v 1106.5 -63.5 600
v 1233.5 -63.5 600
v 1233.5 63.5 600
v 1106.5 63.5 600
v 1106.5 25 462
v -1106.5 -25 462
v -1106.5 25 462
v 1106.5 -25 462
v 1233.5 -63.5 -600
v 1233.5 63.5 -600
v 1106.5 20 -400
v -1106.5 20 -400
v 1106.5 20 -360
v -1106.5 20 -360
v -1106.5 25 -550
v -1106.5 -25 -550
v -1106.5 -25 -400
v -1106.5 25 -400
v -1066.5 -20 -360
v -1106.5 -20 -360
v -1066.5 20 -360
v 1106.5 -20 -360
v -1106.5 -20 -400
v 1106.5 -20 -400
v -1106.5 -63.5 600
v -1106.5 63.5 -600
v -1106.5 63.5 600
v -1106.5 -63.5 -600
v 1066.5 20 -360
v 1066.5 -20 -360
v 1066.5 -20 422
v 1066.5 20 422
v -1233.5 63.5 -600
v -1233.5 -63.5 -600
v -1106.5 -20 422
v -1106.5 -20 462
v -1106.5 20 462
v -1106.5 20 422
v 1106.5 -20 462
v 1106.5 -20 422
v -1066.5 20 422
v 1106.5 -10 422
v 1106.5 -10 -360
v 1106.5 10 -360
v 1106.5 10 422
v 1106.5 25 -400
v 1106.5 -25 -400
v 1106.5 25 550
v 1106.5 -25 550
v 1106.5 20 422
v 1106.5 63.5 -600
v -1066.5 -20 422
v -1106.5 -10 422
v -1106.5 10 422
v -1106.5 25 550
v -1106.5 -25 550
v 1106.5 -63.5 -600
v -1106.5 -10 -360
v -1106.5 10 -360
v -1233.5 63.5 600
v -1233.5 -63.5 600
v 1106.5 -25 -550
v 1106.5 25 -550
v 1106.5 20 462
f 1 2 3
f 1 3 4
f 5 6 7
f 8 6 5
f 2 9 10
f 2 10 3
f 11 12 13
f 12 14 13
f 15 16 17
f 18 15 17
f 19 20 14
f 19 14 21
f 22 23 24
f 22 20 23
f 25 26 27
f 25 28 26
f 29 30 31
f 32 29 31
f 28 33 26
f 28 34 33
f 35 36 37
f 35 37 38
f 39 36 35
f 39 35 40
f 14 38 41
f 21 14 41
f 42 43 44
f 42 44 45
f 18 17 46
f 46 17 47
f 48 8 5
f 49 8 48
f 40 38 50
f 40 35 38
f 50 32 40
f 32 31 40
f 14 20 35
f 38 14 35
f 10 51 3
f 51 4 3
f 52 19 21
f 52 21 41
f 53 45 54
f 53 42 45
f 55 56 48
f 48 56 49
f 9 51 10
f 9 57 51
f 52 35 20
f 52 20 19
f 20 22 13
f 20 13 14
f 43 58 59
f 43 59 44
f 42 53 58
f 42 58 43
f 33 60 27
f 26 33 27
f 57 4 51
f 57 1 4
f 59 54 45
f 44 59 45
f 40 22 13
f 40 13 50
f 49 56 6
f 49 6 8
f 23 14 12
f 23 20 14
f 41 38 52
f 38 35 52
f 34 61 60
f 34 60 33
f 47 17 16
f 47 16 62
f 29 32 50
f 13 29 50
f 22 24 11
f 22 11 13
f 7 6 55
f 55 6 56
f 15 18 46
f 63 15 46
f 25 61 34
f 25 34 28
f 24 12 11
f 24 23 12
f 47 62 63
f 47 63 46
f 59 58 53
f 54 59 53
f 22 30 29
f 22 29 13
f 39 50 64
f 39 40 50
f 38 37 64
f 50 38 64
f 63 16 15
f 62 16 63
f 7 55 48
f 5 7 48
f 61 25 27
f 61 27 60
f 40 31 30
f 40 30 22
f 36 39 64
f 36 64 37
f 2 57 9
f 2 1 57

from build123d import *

# Parameters (mm, degrees)
F1_DEPTH      = 63.5
F1_DEPTH_BACK = 63.5
F0_W          = 2213
F0_H          = 150
F2_DEPTH      = 25
F2_DEPTH_BACK = 25
F0_H_2        = 88
F3_DEPTH      = 20
F3_DEPTH_BACK = 20
F0_W_2        = 40
F0_H_3        = 782
F0_W_3        = 2133
F4_DEPTH      = 10
F4_DEPTH_BACK = 10
F5_DEPTH      = 20
F5_DEPTH_BACK = 20


# Not quite as in the source:
# - a feature names something its author has since deleted; it is built from what else it names


with BuildPart() as f1:
    # F0 (on Front) → F1 (new body, two sides)
    with BuildSketch(Plane.XZ) as f1_sk:
        Polygon((-1106.5, -600), (-1106.5, -550), (-1106.5, -400), (-1106.5, -360), (-1106.5, 422), (-1106.5, 462), (-1106.5, 550), (-1106.5, 600), (-1233.5, 600), (-1233.5, -600), align=None)
    extrude(amount=F1_DEPTH)
    extrude(f1_sk.sketch, amount=-F1_DEPTH_BACK)


with BuildPart() as f1b:
    # F0 (on Front) → F1, piece 2 (new body, two sides)
    with BuildSketch(Plane.XZ) as f1_2_sk:
        Polygon((1106.5, -600), (1233.5, -600), (1233.5, 600), (1106.5, 600), (1106.5, 550), (1106.5, 462), (1106.5, 422), (1106.5, -360), (1106.5, -400), (1106.5, -550), align=None)
    extrude(amount=F1_DEPTH)
    extrude(f1_2_sk.sketch, amount=-F1_DEPTH_BACK)


with BuildPart() as f2:
    # F0 (on Front) → F2 (new body, two sides)
    with BuildSketch(Plane.XZ) as f2_sk:
        with Locations((0, -475)):
            Rectangle(F0_W, F0_H)
    extrude(amount=F2_DEPTH)
    extrude(f2_sk.sketch, amount=-F2_DEPTH_BACK)


with BuildPart() as f2b:
    # F0 (on Front) → F2, piece 2 (new body, two sides)
    with BuildSketch(Plane.XZ) as f2_2_sk:
        with Locations((0, 506)):
            Rectangle(F0_W, F0_H_2)
    extrude(amount=F2_DEPTH)
    extrude(f2_2_sk.sketch, amount=-F2_DEPTH_BACK)


with BuildPart() as f3:
    # F0 (on Front) → F3 (new body, two sides)
    with BuildSketch(Plane.XZ) as f3_sk:
        Polygon((1106.5, 422), (1106.5, 462), (-1106.5, 462), (-1106.5, 422), (-1066.5, 422), (1066.5, 422), align=None)
    extrude(amount=F3_DEPTH)
    extrude(f3_sk.sketch, amount=-F3_DEPTH_BACK)


with BuildPart() as f3b:
    # F0 (on Front) → F3, piece 2 (new body, two sides)
    with BuildSketch(Plane.XZ) as f3_2_sk:
        Polygon((-1106.5, -400), (1106.5, -400), (1106.5, -360), (1066.5, -360), (-1066.5, -360), (-1106.5, -360), align=None)
    extrude(amount=F3_DEPTH)
    extrude(f3_2_sk.sketch, amount=-F3_DEPTH_BACK)


with BuildPart() as f4:
    # F0 (on Front) → F4 (new body, two sides)
    with BuildSketch(Plane.XZ) as f4_sk:
        with Locations((-1086.5, 31)):
            Rectangle(F0_W_2, F0_H_3)
        with Locations((0, 31)):
            Rectangle(F0_W_3, F0_H_3)
        with Locations((1086.5, 31)):
            Rectangle(F0_W_2, F0_H_3)
    extrude(amount=F4_DEPTH)
    extrude(f4_sk.sketch, amount=-F4_DEPTH_BACK)


with BuildPart() as f5:
    # F0 (on Front) → F5 (new body, two sides)
    with BuildSketch(Plane.XZ) as f5_sk:
        with Locations((-1086.5, 31)):
            Rectangle(F0_W_2, F0_H_3)
    extrude(amount=F5_DEPTH)
    extrude(f5_sk.sketch, amount=-F5_DEPTH_BACK)


with BuildPart() as f5b:
    # F0 (on Front) → F5, piece 2 (new body, two sides)
    with BuildSketch(Plane.XZ) as f5_2_sk:
        with Locations((1086.5, 31)):
            Rectangle(F0_W_2, F0_H_3)
    extrude(amount=F5_DEPTH)
    extrude(f5_2_sk.sketch, amount=-F5_DEPTH_BACK)


solid = Compound([f1.part, f1b.part, f2.part, f2b.part, f3.part, f3b.part, f4.part, f5.part, f5b.part])
